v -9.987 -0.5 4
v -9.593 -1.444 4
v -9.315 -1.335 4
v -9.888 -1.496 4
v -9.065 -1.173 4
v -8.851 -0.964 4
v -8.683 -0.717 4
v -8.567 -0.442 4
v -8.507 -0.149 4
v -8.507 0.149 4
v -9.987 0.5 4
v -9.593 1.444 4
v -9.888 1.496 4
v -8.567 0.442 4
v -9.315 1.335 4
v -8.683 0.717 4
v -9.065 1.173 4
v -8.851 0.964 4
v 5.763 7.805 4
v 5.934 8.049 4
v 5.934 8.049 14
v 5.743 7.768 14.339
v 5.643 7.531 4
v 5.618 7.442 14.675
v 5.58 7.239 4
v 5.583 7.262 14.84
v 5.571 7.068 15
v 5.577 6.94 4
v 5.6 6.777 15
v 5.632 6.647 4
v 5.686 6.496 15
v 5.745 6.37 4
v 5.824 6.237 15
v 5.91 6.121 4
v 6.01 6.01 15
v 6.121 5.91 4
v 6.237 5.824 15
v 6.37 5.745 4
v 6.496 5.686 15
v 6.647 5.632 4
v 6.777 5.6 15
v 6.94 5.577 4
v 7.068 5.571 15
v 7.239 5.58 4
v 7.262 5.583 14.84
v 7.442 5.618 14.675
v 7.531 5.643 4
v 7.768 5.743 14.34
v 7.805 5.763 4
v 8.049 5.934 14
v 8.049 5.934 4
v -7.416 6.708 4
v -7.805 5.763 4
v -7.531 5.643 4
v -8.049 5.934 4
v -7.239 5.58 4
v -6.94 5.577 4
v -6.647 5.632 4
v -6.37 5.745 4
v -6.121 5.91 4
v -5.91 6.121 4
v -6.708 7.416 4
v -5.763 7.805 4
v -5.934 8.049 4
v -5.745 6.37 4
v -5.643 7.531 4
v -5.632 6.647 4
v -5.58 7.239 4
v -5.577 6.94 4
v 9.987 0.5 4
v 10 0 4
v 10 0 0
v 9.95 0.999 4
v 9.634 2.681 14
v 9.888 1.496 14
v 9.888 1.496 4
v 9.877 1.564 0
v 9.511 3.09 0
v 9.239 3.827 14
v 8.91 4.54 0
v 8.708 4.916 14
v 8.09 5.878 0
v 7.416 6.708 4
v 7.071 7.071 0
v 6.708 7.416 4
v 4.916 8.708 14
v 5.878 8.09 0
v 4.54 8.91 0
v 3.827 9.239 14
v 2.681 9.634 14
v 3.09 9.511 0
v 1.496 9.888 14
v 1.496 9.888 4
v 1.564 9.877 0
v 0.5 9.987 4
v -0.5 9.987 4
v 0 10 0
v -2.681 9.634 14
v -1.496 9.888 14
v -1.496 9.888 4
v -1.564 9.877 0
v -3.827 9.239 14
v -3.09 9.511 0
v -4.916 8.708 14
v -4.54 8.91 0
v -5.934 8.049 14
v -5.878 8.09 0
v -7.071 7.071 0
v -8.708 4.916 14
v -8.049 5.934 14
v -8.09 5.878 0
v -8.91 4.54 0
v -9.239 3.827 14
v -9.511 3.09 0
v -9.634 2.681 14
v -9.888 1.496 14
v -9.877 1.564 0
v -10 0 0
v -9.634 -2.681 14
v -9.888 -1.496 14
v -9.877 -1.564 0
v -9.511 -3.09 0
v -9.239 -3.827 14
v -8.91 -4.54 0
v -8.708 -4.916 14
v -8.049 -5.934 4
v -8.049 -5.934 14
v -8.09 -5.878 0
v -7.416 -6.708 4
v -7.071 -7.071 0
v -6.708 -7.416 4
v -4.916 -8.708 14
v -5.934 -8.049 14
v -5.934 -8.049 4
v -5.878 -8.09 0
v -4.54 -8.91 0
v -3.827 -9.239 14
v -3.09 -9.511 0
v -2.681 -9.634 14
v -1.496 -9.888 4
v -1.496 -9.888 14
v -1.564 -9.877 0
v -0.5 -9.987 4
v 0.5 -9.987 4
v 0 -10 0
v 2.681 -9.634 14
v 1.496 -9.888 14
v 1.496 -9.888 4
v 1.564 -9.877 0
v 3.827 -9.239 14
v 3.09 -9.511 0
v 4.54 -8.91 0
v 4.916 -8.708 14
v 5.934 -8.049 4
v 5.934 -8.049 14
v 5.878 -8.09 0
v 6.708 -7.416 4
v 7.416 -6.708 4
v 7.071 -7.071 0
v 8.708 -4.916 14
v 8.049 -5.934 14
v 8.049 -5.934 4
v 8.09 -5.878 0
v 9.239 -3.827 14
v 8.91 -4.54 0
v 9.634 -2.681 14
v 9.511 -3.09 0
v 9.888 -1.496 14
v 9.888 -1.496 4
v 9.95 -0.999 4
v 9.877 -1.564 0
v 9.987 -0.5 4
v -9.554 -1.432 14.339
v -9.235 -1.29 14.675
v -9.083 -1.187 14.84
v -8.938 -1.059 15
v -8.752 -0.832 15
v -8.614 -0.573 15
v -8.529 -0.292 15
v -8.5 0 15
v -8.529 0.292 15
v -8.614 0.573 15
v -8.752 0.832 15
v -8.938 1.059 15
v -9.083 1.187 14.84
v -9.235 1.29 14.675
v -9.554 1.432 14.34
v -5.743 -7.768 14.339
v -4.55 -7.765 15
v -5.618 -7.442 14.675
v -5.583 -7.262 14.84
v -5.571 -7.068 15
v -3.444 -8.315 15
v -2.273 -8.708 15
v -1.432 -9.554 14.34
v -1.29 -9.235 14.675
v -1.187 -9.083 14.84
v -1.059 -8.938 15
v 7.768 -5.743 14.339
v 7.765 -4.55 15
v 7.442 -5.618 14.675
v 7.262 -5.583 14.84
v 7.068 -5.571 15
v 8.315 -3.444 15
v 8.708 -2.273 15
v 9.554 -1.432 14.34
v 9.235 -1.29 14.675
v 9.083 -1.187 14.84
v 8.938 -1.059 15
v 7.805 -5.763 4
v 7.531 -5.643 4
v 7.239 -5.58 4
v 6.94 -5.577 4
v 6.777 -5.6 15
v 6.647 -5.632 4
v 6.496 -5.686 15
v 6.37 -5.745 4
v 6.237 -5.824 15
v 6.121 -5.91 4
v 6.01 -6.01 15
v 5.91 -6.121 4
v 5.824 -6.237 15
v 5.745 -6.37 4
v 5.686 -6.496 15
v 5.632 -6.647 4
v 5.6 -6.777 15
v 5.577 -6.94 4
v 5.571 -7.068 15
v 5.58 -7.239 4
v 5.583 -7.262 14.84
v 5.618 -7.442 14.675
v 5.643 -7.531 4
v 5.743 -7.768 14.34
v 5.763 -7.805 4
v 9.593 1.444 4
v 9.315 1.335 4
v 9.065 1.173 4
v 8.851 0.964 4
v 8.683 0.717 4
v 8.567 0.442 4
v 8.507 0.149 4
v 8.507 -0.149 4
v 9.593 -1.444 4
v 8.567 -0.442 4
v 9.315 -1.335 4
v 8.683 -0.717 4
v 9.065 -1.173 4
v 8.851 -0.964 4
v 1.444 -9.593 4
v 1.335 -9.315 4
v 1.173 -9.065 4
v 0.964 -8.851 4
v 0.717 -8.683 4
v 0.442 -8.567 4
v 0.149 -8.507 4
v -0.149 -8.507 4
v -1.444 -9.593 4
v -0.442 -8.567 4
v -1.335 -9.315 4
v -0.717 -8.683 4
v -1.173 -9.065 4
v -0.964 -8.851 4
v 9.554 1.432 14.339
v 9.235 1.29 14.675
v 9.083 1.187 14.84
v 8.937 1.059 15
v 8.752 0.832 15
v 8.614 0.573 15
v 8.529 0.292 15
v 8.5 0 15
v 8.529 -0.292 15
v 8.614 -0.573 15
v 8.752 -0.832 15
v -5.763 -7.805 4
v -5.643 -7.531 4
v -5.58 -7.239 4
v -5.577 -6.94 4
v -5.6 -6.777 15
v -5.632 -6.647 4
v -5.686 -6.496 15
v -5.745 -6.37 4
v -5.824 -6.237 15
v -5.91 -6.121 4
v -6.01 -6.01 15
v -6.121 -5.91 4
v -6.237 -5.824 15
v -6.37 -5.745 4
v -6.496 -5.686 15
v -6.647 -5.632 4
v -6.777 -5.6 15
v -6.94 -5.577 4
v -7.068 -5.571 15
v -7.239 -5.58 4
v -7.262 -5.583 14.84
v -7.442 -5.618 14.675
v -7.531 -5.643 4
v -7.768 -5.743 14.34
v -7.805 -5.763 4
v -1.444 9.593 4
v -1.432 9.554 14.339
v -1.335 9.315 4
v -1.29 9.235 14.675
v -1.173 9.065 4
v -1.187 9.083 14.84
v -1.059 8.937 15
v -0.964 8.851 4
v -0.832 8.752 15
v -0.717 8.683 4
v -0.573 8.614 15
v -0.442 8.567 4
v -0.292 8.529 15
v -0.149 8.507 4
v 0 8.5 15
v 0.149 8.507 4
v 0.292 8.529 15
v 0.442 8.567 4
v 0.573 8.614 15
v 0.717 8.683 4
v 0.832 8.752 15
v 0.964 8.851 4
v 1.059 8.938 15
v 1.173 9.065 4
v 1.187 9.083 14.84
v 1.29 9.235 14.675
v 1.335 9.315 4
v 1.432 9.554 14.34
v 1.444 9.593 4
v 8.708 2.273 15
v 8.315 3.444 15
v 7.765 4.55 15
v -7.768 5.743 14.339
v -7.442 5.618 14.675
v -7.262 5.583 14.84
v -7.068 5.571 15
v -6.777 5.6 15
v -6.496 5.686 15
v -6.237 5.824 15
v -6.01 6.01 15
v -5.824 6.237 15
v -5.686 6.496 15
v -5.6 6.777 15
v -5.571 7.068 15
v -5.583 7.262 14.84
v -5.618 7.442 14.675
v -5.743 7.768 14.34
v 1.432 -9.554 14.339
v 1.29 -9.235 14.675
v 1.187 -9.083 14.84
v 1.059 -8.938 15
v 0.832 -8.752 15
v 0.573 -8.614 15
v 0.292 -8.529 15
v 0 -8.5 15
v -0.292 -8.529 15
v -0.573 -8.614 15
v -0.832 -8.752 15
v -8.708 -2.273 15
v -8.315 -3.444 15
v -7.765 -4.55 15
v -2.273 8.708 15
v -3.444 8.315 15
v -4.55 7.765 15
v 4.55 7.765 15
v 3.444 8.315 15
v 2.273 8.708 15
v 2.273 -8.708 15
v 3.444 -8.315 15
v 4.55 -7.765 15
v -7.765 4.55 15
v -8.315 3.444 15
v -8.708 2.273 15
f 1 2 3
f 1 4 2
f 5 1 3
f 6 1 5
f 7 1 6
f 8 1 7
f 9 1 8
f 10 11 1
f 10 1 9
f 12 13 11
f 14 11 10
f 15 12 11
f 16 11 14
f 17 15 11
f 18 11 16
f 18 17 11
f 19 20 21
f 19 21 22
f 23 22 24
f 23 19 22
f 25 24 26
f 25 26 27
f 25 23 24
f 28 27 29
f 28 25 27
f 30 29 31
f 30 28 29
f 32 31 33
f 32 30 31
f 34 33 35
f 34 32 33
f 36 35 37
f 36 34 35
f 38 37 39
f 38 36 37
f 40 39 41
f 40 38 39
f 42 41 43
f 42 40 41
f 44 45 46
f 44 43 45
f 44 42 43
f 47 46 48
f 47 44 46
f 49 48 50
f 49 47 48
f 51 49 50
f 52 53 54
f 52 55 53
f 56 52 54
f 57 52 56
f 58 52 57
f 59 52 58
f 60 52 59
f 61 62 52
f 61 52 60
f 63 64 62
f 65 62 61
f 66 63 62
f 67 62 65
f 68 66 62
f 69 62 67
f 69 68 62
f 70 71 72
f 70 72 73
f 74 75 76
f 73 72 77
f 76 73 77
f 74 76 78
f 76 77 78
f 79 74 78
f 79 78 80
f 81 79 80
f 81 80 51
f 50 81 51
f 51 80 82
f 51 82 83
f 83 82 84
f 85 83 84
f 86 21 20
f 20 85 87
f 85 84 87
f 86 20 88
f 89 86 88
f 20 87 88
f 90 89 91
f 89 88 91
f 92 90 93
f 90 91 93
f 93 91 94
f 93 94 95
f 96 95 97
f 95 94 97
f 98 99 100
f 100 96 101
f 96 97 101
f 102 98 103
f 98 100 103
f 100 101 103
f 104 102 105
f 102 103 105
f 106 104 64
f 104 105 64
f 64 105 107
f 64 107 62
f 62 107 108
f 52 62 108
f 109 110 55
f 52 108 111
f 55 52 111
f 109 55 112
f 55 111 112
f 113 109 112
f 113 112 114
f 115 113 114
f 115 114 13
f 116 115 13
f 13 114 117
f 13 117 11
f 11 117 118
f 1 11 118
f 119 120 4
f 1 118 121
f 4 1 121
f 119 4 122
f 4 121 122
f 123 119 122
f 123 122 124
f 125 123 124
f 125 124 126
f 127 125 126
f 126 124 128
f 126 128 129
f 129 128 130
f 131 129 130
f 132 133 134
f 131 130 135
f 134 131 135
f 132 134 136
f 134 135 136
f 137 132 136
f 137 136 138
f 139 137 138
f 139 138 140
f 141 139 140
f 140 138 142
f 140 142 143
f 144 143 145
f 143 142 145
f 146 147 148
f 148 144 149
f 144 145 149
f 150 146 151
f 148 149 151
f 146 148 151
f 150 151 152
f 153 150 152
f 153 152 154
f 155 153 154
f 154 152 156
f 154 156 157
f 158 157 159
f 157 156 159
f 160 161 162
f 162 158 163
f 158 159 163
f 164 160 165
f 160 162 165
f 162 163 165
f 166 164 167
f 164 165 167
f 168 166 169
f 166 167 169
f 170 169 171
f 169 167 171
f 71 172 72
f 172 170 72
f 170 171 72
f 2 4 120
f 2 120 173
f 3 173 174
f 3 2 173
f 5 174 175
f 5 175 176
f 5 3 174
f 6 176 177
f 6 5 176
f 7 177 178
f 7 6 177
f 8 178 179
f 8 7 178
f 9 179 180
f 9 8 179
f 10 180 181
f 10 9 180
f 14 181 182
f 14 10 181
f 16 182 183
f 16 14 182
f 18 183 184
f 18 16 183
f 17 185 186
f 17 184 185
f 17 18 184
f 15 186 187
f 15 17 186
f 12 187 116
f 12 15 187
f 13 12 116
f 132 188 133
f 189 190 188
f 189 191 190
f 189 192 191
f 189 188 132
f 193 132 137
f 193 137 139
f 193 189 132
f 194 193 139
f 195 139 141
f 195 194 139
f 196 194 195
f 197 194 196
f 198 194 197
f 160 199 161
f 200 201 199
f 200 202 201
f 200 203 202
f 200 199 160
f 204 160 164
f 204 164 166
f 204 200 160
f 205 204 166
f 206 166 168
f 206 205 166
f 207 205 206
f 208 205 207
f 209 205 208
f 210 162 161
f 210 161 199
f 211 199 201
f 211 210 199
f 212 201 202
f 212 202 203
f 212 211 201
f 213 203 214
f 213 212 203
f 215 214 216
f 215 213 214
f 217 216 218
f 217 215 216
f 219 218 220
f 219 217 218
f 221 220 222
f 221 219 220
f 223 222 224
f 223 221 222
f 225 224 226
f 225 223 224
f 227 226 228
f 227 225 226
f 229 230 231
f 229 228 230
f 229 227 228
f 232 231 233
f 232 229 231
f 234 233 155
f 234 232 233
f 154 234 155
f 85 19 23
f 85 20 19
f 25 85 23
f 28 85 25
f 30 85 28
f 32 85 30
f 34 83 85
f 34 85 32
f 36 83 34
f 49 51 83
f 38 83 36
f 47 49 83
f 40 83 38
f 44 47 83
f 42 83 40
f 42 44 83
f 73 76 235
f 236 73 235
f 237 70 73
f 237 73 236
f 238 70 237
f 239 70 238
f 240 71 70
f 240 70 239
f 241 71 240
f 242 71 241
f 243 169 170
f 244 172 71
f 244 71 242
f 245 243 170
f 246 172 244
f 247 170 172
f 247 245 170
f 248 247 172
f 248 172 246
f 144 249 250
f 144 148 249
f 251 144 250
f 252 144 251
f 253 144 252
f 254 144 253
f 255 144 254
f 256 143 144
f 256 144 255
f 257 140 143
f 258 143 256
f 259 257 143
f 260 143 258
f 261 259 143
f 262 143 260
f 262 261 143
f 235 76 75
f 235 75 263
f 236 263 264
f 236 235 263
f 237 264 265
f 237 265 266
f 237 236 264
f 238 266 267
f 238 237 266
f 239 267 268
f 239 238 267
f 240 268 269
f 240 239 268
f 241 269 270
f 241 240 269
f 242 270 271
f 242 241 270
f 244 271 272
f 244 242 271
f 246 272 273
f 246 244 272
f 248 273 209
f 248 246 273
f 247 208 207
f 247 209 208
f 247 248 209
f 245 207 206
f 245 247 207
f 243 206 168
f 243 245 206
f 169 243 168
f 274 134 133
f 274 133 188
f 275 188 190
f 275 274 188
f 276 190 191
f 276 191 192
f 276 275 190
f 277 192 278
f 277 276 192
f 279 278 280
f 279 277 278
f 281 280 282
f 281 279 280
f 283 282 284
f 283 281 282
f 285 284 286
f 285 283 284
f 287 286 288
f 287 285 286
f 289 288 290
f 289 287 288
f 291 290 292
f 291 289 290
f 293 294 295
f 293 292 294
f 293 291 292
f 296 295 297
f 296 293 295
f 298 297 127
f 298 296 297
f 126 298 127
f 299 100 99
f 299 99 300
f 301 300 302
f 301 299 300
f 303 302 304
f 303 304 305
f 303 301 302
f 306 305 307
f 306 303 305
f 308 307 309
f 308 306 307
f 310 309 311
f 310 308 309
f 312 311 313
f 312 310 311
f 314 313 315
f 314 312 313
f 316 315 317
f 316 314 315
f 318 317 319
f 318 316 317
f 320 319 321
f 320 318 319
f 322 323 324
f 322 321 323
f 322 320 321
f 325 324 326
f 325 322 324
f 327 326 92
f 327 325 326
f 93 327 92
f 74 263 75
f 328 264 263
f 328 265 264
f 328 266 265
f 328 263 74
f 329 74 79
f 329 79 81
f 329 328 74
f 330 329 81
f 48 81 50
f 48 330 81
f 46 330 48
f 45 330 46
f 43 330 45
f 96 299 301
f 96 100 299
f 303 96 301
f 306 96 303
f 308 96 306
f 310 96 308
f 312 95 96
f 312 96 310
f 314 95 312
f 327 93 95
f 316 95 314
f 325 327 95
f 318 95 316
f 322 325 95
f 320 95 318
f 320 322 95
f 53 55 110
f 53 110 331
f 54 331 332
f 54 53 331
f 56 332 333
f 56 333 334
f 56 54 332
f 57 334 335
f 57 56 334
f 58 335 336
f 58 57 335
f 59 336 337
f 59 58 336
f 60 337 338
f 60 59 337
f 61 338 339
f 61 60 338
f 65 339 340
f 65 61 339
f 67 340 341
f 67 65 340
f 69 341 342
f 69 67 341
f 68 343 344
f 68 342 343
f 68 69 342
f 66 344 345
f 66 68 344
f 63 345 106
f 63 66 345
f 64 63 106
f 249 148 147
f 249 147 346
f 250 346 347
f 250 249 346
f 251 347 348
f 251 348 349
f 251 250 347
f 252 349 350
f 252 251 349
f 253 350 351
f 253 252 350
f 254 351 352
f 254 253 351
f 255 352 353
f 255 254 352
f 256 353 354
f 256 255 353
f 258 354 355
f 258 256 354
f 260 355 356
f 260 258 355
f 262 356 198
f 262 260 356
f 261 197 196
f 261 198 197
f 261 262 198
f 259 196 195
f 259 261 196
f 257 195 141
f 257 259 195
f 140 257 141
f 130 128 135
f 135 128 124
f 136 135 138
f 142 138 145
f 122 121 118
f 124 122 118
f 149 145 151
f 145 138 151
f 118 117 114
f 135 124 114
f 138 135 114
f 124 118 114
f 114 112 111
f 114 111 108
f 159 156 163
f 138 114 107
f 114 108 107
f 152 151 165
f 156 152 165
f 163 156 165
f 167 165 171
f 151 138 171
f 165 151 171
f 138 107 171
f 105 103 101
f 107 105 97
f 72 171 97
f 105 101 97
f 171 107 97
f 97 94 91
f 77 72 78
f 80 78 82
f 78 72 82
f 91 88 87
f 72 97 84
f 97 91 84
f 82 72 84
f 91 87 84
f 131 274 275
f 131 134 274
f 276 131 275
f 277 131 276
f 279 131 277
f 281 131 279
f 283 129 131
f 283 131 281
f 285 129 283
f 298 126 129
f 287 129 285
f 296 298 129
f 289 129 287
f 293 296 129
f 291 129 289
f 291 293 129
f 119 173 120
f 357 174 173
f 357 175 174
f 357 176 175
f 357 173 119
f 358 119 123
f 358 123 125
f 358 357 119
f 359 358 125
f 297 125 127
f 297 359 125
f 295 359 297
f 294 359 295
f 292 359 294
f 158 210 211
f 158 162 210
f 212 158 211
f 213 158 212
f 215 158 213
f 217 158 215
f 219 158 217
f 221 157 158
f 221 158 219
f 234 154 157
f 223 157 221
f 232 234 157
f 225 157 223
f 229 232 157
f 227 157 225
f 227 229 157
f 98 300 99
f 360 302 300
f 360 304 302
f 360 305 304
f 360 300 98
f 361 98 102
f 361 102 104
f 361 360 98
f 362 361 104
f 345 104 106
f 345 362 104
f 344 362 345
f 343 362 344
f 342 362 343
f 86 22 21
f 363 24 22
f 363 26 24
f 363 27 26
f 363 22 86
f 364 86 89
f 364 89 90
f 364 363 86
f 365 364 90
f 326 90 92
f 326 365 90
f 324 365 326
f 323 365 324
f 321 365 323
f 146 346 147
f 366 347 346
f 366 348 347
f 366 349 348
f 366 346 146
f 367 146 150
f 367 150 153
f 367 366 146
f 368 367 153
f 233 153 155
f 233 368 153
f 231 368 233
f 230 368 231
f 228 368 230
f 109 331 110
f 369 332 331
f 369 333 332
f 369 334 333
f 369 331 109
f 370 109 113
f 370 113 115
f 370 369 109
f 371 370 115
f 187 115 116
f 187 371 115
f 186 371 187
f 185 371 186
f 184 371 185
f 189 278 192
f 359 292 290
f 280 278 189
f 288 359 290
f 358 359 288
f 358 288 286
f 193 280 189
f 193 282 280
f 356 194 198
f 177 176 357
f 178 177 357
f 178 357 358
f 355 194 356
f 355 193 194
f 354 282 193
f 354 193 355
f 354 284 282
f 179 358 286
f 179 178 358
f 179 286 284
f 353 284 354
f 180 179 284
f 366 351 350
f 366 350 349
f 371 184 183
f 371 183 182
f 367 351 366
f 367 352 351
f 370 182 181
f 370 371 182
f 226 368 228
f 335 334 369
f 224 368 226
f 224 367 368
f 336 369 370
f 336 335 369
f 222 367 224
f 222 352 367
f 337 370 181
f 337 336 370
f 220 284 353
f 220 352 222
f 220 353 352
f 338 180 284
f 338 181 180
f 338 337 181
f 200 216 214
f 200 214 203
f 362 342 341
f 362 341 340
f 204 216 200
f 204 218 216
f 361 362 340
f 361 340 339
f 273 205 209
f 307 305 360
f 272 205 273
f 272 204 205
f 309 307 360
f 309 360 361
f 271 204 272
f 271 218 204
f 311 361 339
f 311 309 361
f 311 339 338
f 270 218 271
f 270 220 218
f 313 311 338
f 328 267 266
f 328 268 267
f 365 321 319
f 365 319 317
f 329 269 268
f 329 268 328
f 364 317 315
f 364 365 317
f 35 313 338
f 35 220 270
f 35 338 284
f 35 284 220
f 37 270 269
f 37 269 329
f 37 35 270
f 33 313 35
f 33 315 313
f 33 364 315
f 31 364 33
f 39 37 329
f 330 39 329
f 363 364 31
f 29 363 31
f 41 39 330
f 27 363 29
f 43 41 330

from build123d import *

# Parameters (mm, degrees)
CYLINDER001_R     = 1.5
CYLINDER001_DEPTH = 20
ARRAY_COUNT       = 8
CYLINDER_R        = 10
CYLINDER_DEPTH    = 15
CHAMFER_SIZE      = 1


with BuildPart() as array:
    # Cylinder001 → Cylinder001 (new body)
    with BuildSketch(Plane.XY.offset(4)):
        Circle(CYLINDER001_R)
    extrude(amount=CYLINDER001_DEPTH)

    # Array: Array ×8 about axis
    array_axis = Axis((10, 0, 0), (0, 0, 1))


with BuildPart() as array_1:
    add(array.part)
    for i in range(1, ARRAY_COUNT):
        add(array.part.rotate(array_axis, i * 360 / ARRAY_COUNT))


with BuildPart() as array_2:
    # Array placement: moved
    add(array_1.part.moved(Location((-10, 0, 0))))


with BuildPart() as chamfer_body:
    # Cylinder → Cylinder (new body)
    with BuildSketch(Plane.XY):
        Circle(CYLINDER_R)
    extrude(amount=CYLINDER_DEPTH)

    # Cut: cut Array
    add(array_2.part, mode=Mode.SUBTRACT)

    # Chamfer
    chamfer_edges = [chamfer_body.edges().sort_by_distance(p)[0] for p in [
        (9.238795, -3.826834, 15),
        (3.826834, -9.238795, 15),
        (-3.826834, -9.238795, 15),
        (-9.238795, -3.826834, 15),
        (-9.238795, 3.826834, 15),
        (-3.826834, 9.238795, 15),
        (3.826834, 9.238795, 15),
        (9.238795, 3.826834, 15),
    ]]
    chamfer(chamfer_edges, length=CHAMFER_SIZE)


solid = chamfer_body.part
